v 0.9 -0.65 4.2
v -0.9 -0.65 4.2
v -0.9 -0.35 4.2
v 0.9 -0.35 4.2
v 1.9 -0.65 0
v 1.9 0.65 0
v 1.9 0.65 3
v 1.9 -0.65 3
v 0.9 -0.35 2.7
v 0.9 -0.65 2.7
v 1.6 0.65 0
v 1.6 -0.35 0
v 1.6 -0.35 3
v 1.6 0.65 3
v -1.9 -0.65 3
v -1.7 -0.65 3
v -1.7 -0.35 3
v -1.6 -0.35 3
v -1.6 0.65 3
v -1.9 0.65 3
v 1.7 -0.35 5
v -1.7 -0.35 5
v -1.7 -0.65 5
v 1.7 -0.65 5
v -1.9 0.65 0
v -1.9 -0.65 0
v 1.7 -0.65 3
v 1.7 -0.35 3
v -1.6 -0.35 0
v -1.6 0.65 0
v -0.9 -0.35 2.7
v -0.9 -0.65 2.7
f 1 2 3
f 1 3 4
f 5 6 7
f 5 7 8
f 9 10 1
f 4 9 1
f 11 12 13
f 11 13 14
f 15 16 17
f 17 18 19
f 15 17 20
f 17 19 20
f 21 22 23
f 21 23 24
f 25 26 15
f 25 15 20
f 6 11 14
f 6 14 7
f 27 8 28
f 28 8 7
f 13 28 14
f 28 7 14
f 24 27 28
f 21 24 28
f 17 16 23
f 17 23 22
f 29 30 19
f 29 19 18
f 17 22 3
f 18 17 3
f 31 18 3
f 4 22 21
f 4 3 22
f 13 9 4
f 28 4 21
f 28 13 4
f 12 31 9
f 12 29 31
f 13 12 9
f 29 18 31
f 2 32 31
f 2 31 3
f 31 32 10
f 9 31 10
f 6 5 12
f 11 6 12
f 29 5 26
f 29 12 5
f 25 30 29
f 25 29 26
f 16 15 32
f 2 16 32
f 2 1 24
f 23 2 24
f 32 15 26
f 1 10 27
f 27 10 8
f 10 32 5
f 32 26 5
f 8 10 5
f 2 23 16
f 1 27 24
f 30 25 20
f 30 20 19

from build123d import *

# Parameters (mm, degrees)
EXTRUDE_247_DEPTH     = 3
SKETCH8_W             = 3.4
SKETCH8_H             = 0.3
EXTRUDE_374_DEPTH     = 2
SKETCH9_W             = 1.8
SKETCH9_H             = 1.5
CUT_EXTRUDE_500_DEPTH = 2


with BuildPart() as part:
    # Sketch1 → Extrude 247 (new body)
    with BuildSketch(Plane.XY):
        Polygon((-1.9, 0.65), (-1.6, 0.65), (-1.6, -0.35), (1.6, -0.35), (1.6, 0.65), (1.9, 0.65), (1.9, -0.65), (-1.9, -0.65), align=None)
    extrude(amount=EXTRUDE_247_DEPTH)

    # Sketch8 → Extrude 374 (add)
    with BuildSketch(Plane.XY.offset(3)):
        with Locations((0, -0.5)):
            Rectangle(SKETCH8_W, SKETCH8_H)
    extrude(amount=EXTRUDE_374_DEPTH)

    # Sketch9 → Cut-Extrude 500 (cut)
    with BuildSketch(Plane.XZ.offset(0.65)):
        with Locations((0, 3.45)):
            Rectangle(SKETCH9_W, SKETCH9_H)
    extrude(amount=-CUT_EXTRUDE_500_DEPTH, mode=Mode.SUBTRACT)


solid = part.part
